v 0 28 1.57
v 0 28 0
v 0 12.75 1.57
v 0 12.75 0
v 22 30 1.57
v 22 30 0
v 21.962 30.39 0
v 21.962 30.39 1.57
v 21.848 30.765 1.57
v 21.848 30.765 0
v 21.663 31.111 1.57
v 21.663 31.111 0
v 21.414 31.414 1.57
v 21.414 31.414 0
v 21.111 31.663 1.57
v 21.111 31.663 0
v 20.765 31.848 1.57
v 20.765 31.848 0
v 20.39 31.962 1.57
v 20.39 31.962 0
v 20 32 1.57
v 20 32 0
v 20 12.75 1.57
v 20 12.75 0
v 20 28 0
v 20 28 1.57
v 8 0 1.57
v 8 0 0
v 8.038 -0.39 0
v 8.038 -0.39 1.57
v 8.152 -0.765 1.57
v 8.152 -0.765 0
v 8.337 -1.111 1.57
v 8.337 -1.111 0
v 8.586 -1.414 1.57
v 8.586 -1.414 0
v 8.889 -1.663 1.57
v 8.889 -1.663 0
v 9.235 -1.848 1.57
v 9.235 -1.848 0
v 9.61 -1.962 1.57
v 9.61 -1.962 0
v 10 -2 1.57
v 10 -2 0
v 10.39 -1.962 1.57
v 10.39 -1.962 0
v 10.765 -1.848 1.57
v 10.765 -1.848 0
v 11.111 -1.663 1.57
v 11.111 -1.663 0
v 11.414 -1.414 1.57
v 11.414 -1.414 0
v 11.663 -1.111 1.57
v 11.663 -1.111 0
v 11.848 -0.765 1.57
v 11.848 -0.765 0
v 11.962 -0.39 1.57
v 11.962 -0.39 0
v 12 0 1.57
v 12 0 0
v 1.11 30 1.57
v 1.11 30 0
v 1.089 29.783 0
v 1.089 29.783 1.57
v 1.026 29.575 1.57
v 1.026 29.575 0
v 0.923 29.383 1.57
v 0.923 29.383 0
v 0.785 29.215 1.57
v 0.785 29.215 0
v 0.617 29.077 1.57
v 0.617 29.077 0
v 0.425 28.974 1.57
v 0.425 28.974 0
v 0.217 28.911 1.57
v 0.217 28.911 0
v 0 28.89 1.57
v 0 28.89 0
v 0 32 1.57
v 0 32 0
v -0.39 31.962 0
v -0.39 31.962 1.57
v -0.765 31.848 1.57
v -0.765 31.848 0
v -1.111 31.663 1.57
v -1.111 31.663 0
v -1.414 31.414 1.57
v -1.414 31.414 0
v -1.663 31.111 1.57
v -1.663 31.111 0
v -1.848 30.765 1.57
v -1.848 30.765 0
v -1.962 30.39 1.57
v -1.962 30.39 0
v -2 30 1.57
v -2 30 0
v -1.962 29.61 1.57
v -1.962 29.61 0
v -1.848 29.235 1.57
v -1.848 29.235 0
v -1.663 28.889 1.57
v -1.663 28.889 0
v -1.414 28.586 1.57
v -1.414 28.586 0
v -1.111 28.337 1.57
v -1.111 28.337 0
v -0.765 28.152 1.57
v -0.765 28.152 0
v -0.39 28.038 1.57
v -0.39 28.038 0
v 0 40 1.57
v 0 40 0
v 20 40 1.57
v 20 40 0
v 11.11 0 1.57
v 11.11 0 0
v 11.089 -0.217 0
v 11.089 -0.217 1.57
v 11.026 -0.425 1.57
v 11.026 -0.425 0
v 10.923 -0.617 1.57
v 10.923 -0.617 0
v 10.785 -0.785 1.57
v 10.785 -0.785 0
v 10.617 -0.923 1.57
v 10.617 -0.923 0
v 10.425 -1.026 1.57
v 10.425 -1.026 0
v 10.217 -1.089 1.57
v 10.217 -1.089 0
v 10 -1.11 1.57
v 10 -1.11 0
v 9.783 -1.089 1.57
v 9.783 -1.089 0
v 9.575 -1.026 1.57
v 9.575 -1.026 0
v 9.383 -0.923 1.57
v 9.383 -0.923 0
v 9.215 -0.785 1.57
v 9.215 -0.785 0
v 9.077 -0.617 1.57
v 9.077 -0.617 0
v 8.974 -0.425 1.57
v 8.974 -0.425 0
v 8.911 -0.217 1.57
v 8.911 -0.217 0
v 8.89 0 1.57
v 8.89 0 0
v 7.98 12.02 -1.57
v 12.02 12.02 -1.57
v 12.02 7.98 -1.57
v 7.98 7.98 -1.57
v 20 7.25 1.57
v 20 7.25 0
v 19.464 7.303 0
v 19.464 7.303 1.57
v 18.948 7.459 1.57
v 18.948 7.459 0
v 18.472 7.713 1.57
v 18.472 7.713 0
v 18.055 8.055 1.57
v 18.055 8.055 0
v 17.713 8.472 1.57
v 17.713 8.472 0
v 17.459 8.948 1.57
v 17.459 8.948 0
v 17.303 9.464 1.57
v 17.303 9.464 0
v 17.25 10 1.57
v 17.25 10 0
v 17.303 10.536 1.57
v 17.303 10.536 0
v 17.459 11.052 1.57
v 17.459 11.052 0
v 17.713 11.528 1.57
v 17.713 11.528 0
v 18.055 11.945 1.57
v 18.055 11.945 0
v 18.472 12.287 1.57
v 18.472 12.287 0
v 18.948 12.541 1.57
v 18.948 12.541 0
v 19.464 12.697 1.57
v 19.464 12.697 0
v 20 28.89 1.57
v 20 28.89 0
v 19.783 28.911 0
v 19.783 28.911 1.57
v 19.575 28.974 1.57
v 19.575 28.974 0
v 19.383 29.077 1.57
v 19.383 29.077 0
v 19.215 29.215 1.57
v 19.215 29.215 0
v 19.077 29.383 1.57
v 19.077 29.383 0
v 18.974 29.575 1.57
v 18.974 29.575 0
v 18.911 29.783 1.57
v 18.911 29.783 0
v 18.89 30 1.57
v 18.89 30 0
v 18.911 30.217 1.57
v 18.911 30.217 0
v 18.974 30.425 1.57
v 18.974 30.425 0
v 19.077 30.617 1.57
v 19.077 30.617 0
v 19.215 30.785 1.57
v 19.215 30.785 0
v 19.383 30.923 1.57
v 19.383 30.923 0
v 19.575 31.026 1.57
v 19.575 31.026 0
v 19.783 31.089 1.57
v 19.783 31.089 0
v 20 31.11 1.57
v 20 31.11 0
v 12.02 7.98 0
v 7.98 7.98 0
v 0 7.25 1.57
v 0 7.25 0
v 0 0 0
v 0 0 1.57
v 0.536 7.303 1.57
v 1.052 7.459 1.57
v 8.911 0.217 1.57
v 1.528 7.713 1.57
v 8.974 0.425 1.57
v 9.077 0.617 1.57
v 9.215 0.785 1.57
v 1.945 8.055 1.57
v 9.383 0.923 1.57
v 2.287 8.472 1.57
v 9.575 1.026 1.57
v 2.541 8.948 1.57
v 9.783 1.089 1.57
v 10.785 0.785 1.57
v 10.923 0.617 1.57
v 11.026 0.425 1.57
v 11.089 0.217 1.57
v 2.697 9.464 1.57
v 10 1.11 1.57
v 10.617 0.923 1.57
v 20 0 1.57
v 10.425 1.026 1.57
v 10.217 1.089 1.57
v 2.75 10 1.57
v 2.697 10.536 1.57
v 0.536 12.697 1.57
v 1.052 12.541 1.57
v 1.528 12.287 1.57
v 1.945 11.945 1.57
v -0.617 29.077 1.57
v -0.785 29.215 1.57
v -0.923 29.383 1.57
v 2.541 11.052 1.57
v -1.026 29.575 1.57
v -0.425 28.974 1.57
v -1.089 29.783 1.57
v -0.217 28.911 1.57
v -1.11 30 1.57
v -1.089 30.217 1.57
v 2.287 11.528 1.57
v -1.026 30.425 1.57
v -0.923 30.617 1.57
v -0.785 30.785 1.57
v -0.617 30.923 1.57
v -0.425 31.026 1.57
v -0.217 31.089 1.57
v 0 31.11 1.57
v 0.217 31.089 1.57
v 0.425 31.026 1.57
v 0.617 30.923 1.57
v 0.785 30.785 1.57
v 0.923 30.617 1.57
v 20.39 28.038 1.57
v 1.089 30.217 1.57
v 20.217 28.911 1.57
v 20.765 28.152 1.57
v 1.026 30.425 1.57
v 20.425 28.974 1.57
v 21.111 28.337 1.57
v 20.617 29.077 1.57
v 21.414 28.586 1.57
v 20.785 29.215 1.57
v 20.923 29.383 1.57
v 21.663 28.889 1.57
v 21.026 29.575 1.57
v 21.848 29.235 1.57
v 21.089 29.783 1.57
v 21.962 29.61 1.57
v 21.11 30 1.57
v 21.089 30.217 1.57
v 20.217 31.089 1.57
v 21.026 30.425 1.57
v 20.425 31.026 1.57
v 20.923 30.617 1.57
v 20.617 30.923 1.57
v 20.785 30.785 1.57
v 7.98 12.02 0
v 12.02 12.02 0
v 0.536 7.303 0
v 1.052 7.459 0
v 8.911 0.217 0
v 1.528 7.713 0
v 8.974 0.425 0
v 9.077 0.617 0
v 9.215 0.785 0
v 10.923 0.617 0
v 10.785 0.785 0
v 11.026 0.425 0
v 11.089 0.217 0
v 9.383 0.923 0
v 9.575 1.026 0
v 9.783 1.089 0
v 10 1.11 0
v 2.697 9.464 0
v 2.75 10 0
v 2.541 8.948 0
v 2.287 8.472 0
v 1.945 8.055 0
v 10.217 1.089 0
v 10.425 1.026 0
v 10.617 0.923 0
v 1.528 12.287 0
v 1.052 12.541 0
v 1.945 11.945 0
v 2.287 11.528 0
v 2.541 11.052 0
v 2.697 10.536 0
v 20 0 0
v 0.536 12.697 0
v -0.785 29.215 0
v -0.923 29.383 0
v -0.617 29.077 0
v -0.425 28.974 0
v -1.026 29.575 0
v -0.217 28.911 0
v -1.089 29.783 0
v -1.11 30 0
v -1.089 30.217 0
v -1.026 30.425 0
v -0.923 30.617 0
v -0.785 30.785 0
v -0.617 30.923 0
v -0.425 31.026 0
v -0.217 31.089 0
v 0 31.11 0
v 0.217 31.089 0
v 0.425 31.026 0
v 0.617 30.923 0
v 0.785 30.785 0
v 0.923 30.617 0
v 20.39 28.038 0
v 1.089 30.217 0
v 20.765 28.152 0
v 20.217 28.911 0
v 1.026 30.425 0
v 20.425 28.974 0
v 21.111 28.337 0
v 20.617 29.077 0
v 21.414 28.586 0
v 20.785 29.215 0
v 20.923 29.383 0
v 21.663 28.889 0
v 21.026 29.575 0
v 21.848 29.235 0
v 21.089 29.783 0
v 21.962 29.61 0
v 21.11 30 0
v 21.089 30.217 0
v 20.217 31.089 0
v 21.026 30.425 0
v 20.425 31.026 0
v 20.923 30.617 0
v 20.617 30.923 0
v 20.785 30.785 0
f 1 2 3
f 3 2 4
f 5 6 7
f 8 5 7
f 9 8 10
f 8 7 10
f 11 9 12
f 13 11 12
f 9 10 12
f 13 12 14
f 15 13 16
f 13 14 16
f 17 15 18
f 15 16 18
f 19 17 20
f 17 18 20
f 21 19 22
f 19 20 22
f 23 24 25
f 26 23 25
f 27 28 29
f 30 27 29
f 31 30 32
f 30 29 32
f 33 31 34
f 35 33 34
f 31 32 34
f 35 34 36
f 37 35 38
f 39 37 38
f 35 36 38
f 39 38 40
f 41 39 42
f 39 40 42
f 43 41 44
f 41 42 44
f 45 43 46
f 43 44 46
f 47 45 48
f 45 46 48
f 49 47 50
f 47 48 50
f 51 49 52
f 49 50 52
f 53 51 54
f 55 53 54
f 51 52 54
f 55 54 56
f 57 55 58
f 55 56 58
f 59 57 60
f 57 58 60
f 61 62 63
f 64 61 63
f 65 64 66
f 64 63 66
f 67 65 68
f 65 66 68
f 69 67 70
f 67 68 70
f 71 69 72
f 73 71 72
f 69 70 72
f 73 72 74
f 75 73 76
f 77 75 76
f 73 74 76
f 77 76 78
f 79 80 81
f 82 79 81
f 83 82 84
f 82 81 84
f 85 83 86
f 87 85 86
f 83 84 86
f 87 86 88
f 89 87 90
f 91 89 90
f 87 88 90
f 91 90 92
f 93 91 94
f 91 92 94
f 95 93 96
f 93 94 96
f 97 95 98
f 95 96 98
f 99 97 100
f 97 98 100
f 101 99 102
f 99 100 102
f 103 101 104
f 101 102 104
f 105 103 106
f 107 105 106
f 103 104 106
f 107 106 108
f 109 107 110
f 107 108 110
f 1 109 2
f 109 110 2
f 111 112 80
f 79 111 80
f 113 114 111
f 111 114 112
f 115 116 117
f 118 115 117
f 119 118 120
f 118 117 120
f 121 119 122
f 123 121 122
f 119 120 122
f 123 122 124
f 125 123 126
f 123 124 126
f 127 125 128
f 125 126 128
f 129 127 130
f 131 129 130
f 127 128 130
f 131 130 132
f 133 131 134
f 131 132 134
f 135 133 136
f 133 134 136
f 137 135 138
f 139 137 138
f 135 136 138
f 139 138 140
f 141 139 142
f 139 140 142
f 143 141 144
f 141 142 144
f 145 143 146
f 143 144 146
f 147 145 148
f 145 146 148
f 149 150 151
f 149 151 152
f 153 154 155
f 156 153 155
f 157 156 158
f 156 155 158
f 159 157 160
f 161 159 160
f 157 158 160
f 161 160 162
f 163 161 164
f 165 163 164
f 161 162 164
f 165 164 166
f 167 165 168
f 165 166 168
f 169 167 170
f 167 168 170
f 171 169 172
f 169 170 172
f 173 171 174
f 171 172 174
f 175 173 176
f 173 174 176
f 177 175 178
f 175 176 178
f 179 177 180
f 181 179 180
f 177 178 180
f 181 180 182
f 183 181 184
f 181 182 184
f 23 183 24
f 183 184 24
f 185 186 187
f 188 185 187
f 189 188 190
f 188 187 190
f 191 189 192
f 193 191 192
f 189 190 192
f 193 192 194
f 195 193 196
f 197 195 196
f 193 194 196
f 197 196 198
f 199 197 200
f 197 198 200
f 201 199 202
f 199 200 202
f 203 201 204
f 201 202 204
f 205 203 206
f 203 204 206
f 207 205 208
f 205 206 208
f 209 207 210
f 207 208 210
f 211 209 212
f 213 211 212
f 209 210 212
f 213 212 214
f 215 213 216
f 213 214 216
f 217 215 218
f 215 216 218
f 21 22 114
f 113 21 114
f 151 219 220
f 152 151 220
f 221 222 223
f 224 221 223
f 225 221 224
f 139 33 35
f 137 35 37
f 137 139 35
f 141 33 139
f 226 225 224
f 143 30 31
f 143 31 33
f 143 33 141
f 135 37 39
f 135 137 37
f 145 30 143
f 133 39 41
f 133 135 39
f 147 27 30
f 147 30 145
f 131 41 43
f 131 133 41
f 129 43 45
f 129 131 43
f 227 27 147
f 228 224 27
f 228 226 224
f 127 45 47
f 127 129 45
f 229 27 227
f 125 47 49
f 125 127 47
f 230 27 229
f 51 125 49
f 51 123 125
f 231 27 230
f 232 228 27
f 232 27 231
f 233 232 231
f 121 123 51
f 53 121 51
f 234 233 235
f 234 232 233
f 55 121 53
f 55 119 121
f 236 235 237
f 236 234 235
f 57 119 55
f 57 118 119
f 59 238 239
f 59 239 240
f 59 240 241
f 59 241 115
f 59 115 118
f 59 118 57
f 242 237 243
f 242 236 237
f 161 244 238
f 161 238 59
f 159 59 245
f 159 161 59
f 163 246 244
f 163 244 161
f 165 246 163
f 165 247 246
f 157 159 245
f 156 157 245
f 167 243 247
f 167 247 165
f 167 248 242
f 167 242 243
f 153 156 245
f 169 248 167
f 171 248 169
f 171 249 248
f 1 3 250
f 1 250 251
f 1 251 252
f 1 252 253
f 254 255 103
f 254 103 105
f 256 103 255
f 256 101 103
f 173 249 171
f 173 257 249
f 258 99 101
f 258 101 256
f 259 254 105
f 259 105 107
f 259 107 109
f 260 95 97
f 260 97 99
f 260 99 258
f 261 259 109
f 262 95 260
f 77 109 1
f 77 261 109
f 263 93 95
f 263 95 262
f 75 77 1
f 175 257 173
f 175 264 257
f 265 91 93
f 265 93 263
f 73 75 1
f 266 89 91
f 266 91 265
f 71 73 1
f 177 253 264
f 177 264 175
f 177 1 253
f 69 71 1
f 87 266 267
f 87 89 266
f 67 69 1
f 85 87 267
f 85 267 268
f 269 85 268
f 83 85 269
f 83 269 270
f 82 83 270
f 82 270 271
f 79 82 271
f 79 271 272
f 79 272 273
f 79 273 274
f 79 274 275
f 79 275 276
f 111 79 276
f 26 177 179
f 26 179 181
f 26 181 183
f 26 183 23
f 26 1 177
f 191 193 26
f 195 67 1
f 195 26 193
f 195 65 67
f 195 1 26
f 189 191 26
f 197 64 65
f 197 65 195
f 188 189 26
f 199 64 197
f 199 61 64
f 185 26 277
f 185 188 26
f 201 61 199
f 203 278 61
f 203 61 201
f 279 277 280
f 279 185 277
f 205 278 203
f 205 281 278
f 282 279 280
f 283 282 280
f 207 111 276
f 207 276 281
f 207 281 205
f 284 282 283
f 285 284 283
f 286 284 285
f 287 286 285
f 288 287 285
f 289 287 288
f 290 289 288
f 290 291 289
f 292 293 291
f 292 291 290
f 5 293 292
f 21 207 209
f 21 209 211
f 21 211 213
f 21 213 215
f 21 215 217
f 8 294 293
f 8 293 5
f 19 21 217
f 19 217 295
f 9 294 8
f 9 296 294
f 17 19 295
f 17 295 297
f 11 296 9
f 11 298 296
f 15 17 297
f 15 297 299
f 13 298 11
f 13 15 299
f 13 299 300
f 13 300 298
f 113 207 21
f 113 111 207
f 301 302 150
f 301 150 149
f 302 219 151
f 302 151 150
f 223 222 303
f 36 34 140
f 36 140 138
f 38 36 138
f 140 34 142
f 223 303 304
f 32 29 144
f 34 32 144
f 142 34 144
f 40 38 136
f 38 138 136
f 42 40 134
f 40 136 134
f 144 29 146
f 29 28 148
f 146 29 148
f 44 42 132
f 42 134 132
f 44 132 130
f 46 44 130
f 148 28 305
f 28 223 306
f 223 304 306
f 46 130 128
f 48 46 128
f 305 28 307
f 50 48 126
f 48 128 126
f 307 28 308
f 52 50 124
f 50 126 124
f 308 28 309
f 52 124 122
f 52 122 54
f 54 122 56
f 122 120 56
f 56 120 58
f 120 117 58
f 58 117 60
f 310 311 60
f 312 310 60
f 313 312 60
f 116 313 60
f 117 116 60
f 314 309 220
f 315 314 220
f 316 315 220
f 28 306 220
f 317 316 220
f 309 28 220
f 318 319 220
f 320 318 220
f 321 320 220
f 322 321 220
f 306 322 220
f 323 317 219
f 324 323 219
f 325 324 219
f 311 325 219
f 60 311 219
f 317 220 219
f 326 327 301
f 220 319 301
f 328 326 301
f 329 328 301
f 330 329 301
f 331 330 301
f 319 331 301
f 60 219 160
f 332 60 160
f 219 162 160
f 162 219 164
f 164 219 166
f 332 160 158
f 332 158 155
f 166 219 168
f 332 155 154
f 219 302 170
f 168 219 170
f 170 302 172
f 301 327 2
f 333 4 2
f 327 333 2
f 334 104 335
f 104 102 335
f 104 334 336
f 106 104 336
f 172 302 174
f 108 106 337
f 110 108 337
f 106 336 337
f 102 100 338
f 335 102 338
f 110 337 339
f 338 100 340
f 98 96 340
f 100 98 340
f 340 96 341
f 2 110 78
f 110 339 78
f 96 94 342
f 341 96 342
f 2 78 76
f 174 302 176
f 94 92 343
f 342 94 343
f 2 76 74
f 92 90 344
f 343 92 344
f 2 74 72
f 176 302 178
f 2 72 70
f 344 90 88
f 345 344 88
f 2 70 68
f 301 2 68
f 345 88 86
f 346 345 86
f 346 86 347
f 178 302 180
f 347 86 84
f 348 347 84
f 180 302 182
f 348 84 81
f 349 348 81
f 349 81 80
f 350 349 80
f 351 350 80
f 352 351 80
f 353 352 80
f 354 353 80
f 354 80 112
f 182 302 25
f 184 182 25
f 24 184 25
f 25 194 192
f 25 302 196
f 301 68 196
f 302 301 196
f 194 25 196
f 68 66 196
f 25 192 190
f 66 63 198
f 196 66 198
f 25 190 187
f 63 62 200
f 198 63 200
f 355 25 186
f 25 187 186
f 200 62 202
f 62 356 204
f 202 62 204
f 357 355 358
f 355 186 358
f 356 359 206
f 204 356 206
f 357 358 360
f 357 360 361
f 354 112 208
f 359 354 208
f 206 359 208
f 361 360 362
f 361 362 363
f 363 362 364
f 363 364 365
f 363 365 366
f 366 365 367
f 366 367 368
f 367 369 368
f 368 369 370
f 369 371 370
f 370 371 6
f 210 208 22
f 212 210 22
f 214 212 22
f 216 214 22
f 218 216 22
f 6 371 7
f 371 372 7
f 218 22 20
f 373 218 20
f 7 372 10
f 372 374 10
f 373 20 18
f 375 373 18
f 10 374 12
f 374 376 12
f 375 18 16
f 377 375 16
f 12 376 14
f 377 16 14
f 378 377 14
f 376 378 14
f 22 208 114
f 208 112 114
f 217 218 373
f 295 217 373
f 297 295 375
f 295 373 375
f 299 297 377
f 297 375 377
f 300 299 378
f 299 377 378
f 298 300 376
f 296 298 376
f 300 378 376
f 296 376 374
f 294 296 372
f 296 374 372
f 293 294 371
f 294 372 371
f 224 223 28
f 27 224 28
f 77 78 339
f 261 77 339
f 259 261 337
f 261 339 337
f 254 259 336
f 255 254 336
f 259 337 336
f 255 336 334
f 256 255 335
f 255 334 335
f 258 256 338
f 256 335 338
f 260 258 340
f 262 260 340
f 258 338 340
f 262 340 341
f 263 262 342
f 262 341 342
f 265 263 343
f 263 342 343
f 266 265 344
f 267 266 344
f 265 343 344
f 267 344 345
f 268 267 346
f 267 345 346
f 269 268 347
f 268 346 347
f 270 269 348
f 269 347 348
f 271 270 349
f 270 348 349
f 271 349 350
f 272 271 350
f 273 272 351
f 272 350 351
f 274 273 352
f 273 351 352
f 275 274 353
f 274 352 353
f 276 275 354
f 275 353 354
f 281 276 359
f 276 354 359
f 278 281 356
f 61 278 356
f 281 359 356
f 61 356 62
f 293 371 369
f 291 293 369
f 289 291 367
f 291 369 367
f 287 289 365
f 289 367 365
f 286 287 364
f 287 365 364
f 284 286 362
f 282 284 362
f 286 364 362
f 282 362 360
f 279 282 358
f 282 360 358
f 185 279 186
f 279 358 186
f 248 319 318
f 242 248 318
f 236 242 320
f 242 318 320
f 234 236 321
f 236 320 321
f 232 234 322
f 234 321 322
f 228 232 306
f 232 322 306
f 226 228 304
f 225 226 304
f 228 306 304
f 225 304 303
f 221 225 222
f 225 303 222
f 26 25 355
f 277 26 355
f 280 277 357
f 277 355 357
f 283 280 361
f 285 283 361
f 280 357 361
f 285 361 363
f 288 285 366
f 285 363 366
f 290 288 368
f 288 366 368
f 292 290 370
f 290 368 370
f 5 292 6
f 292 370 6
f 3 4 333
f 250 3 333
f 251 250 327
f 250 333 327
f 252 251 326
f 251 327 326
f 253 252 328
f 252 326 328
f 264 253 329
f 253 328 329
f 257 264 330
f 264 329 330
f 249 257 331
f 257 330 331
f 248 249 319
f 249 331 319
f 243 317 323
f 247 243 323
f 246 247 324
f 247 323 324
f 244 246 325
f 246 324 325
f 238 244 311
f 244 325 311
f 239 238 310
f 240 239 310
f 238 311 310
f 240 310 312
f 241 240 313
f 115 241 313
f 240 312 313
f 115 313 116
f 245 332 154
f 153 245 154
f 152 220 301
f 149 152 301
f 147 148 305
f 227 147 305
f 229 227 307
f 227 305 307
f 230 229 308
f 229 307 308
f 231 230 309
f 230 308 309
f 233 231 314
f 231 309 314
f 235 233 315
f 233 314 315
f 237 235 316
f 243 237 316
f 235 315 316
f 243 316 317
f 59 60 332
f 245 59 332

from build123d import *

# Parameters (mm, degrees)
BOSS_EXTRUDE1_DEPTH = 1.57
SKETCH2_W           = 4.040944922
SKETCH2_H           = 4.040944922
BOSS_EXTRUDE2_DEPTH = 1.57


with BuildPart() as part:
    # Sketch1 → Boss-Extrude1 (new body)
    with BuildSketch(Plane.XY):
        with BuildLine():
            Line((10, 2), (10, 40))
            Line((10, 40), (0, 40))
            Line((0, 40), (0, 32))
            ThreePointArc((0, 32), (1.414213562, 31.414213562), (2, 30))
            ThreePointArc((2, 30), (1.414213562, 28.585786438), (0, 28))
            Line((0, 28), (0, 12.75))
            ThreePointArc((0, 12.75), (1.944543648, 11.944543648), (2.75, 10))
            ThreePointArc((2.75, 10), (1.944543648, 8.055456352), (0, 7.25))
            Line((0, 7.25), (0, 0))
            Line((0, 0), (8, 0))
            ThreePointArc((8, 0), (8.585786438, 1.414213562), (10, 2))
        make_face()
        with BuildLine():
            Line((20, 40), (10, 40))
            Line((10, 40), (10, 2))
            ThreePointArc((10, 2), (11.414213562, 1.414213562), (12, 0))
            Line((12, 0), (20, 0))
            Line((20, 0), (20, 7.25))
            ThreePointArc((20, 7.25), (17.25, 10), (20, 12.75))
            Line((20, 12.75), (20, 28))
            ThreePointArc((20, 28), (18, 30), (20, 32))
            Line((20, 32), (20, 40))
        make_face()
        with BuildLine():
            ThreePointArc((2, 30), (1.414213562, 31.414213562), (0, 32))
            Line((0, 32), (0, 31.11))
            ThreePointArc((0, 31.11), (0.784888527, 30.784888527), (1.11, 30))
            ThreePointArc((1.11, 30), (0.784888527, 29.215111473), (0, 28.89))
            Line((0, 28.89), (0, 28))
            ThreePointArc((0, 28), (1.414213562, 28.585786438), (2, 30))
        make_face()
        with BuildLine():
            Line((0, 31.11), (0, 32))
            ThreePointArc((0, 32), (-2, 30), (0, 28))
            Line((0, 28), (0, 28.89))
            ThreePointArc((0, 28.89), (-1.11, 30), (0, 31.11))
        make_face()
        with BuildLine():
            ThreePointArc((22, 30), (21.414213562, 31.414213562), (20, 32))
            Line((20, 32), (20, 31.11))
            ThreePointArc((20, 31.11), (20.784888527, 30.784888527), (21.11, 30))
            ThreePointArc((21.11, 30), (20.784888527, 29.215111473), (20, 28.89))
            Line((20, 28.89), (20, 28))
            ThreePointArc((20, 28), (21.414213562, 28.585786438), (22, 30))
        make_face()
        with BuildLine():
            Line((20, 31.11), (20, 32))
            ThreePointArc((20, 32), (18, 30), (20, 28))
            Line((20, 28), (20, 28.89))
            ThreePointArc((20, 28.89), (18.89, 30), (20, 31.11))
        make_face()
        with BuildLine():
            ThreePointArc((8, 0), (10, -2), (12, 0))
            Line((12, 0), (11.11, 0))
            ThreePointArc((11.11, 0), (10, -1.11), (8.89, 0))
            Line((8.89, 0), (8, 0))
        make_face()
        with BuildLine():
            ThreePointArc((12, 0), (11.414213562, 1.414213562), (10, 2))
            Line((10, 2), (10, 1.11))
            ThreePointArc((10, 1.11), (10.784888527, 0.784888527), (11.11, 0))
            Line((11.11, 0), (12, 0))
        make_face()
        with BuildLine():
            Line((10, 1.11), (10, 2))
            ThreePointArc((10, 2), (8.585786438, 1.414213562), (8, 0))
            Line((8, 0), (8.89, 0))
            ThreePointArc((8.89, 0), (9.215111473, 0.784888527), (10, 1.11))
        make_face()
    extrude(amount=BOSS_EXTRUDE1_DEPTH)

    # Sketch2 → Boss-Extrude2 (add)
    with BuildSketch(Plane(origin=(0, 0, 0), x_dir=(-1, 0, 0), z_dir=(0, 0, -1))):
        with Locations((-10, 10)):
            Rectangle(SKETCH2_W, SKETCH2_H)
    extrude(amount=BOSS_EXTRUDE2_DEPTH)


solid = part.part
